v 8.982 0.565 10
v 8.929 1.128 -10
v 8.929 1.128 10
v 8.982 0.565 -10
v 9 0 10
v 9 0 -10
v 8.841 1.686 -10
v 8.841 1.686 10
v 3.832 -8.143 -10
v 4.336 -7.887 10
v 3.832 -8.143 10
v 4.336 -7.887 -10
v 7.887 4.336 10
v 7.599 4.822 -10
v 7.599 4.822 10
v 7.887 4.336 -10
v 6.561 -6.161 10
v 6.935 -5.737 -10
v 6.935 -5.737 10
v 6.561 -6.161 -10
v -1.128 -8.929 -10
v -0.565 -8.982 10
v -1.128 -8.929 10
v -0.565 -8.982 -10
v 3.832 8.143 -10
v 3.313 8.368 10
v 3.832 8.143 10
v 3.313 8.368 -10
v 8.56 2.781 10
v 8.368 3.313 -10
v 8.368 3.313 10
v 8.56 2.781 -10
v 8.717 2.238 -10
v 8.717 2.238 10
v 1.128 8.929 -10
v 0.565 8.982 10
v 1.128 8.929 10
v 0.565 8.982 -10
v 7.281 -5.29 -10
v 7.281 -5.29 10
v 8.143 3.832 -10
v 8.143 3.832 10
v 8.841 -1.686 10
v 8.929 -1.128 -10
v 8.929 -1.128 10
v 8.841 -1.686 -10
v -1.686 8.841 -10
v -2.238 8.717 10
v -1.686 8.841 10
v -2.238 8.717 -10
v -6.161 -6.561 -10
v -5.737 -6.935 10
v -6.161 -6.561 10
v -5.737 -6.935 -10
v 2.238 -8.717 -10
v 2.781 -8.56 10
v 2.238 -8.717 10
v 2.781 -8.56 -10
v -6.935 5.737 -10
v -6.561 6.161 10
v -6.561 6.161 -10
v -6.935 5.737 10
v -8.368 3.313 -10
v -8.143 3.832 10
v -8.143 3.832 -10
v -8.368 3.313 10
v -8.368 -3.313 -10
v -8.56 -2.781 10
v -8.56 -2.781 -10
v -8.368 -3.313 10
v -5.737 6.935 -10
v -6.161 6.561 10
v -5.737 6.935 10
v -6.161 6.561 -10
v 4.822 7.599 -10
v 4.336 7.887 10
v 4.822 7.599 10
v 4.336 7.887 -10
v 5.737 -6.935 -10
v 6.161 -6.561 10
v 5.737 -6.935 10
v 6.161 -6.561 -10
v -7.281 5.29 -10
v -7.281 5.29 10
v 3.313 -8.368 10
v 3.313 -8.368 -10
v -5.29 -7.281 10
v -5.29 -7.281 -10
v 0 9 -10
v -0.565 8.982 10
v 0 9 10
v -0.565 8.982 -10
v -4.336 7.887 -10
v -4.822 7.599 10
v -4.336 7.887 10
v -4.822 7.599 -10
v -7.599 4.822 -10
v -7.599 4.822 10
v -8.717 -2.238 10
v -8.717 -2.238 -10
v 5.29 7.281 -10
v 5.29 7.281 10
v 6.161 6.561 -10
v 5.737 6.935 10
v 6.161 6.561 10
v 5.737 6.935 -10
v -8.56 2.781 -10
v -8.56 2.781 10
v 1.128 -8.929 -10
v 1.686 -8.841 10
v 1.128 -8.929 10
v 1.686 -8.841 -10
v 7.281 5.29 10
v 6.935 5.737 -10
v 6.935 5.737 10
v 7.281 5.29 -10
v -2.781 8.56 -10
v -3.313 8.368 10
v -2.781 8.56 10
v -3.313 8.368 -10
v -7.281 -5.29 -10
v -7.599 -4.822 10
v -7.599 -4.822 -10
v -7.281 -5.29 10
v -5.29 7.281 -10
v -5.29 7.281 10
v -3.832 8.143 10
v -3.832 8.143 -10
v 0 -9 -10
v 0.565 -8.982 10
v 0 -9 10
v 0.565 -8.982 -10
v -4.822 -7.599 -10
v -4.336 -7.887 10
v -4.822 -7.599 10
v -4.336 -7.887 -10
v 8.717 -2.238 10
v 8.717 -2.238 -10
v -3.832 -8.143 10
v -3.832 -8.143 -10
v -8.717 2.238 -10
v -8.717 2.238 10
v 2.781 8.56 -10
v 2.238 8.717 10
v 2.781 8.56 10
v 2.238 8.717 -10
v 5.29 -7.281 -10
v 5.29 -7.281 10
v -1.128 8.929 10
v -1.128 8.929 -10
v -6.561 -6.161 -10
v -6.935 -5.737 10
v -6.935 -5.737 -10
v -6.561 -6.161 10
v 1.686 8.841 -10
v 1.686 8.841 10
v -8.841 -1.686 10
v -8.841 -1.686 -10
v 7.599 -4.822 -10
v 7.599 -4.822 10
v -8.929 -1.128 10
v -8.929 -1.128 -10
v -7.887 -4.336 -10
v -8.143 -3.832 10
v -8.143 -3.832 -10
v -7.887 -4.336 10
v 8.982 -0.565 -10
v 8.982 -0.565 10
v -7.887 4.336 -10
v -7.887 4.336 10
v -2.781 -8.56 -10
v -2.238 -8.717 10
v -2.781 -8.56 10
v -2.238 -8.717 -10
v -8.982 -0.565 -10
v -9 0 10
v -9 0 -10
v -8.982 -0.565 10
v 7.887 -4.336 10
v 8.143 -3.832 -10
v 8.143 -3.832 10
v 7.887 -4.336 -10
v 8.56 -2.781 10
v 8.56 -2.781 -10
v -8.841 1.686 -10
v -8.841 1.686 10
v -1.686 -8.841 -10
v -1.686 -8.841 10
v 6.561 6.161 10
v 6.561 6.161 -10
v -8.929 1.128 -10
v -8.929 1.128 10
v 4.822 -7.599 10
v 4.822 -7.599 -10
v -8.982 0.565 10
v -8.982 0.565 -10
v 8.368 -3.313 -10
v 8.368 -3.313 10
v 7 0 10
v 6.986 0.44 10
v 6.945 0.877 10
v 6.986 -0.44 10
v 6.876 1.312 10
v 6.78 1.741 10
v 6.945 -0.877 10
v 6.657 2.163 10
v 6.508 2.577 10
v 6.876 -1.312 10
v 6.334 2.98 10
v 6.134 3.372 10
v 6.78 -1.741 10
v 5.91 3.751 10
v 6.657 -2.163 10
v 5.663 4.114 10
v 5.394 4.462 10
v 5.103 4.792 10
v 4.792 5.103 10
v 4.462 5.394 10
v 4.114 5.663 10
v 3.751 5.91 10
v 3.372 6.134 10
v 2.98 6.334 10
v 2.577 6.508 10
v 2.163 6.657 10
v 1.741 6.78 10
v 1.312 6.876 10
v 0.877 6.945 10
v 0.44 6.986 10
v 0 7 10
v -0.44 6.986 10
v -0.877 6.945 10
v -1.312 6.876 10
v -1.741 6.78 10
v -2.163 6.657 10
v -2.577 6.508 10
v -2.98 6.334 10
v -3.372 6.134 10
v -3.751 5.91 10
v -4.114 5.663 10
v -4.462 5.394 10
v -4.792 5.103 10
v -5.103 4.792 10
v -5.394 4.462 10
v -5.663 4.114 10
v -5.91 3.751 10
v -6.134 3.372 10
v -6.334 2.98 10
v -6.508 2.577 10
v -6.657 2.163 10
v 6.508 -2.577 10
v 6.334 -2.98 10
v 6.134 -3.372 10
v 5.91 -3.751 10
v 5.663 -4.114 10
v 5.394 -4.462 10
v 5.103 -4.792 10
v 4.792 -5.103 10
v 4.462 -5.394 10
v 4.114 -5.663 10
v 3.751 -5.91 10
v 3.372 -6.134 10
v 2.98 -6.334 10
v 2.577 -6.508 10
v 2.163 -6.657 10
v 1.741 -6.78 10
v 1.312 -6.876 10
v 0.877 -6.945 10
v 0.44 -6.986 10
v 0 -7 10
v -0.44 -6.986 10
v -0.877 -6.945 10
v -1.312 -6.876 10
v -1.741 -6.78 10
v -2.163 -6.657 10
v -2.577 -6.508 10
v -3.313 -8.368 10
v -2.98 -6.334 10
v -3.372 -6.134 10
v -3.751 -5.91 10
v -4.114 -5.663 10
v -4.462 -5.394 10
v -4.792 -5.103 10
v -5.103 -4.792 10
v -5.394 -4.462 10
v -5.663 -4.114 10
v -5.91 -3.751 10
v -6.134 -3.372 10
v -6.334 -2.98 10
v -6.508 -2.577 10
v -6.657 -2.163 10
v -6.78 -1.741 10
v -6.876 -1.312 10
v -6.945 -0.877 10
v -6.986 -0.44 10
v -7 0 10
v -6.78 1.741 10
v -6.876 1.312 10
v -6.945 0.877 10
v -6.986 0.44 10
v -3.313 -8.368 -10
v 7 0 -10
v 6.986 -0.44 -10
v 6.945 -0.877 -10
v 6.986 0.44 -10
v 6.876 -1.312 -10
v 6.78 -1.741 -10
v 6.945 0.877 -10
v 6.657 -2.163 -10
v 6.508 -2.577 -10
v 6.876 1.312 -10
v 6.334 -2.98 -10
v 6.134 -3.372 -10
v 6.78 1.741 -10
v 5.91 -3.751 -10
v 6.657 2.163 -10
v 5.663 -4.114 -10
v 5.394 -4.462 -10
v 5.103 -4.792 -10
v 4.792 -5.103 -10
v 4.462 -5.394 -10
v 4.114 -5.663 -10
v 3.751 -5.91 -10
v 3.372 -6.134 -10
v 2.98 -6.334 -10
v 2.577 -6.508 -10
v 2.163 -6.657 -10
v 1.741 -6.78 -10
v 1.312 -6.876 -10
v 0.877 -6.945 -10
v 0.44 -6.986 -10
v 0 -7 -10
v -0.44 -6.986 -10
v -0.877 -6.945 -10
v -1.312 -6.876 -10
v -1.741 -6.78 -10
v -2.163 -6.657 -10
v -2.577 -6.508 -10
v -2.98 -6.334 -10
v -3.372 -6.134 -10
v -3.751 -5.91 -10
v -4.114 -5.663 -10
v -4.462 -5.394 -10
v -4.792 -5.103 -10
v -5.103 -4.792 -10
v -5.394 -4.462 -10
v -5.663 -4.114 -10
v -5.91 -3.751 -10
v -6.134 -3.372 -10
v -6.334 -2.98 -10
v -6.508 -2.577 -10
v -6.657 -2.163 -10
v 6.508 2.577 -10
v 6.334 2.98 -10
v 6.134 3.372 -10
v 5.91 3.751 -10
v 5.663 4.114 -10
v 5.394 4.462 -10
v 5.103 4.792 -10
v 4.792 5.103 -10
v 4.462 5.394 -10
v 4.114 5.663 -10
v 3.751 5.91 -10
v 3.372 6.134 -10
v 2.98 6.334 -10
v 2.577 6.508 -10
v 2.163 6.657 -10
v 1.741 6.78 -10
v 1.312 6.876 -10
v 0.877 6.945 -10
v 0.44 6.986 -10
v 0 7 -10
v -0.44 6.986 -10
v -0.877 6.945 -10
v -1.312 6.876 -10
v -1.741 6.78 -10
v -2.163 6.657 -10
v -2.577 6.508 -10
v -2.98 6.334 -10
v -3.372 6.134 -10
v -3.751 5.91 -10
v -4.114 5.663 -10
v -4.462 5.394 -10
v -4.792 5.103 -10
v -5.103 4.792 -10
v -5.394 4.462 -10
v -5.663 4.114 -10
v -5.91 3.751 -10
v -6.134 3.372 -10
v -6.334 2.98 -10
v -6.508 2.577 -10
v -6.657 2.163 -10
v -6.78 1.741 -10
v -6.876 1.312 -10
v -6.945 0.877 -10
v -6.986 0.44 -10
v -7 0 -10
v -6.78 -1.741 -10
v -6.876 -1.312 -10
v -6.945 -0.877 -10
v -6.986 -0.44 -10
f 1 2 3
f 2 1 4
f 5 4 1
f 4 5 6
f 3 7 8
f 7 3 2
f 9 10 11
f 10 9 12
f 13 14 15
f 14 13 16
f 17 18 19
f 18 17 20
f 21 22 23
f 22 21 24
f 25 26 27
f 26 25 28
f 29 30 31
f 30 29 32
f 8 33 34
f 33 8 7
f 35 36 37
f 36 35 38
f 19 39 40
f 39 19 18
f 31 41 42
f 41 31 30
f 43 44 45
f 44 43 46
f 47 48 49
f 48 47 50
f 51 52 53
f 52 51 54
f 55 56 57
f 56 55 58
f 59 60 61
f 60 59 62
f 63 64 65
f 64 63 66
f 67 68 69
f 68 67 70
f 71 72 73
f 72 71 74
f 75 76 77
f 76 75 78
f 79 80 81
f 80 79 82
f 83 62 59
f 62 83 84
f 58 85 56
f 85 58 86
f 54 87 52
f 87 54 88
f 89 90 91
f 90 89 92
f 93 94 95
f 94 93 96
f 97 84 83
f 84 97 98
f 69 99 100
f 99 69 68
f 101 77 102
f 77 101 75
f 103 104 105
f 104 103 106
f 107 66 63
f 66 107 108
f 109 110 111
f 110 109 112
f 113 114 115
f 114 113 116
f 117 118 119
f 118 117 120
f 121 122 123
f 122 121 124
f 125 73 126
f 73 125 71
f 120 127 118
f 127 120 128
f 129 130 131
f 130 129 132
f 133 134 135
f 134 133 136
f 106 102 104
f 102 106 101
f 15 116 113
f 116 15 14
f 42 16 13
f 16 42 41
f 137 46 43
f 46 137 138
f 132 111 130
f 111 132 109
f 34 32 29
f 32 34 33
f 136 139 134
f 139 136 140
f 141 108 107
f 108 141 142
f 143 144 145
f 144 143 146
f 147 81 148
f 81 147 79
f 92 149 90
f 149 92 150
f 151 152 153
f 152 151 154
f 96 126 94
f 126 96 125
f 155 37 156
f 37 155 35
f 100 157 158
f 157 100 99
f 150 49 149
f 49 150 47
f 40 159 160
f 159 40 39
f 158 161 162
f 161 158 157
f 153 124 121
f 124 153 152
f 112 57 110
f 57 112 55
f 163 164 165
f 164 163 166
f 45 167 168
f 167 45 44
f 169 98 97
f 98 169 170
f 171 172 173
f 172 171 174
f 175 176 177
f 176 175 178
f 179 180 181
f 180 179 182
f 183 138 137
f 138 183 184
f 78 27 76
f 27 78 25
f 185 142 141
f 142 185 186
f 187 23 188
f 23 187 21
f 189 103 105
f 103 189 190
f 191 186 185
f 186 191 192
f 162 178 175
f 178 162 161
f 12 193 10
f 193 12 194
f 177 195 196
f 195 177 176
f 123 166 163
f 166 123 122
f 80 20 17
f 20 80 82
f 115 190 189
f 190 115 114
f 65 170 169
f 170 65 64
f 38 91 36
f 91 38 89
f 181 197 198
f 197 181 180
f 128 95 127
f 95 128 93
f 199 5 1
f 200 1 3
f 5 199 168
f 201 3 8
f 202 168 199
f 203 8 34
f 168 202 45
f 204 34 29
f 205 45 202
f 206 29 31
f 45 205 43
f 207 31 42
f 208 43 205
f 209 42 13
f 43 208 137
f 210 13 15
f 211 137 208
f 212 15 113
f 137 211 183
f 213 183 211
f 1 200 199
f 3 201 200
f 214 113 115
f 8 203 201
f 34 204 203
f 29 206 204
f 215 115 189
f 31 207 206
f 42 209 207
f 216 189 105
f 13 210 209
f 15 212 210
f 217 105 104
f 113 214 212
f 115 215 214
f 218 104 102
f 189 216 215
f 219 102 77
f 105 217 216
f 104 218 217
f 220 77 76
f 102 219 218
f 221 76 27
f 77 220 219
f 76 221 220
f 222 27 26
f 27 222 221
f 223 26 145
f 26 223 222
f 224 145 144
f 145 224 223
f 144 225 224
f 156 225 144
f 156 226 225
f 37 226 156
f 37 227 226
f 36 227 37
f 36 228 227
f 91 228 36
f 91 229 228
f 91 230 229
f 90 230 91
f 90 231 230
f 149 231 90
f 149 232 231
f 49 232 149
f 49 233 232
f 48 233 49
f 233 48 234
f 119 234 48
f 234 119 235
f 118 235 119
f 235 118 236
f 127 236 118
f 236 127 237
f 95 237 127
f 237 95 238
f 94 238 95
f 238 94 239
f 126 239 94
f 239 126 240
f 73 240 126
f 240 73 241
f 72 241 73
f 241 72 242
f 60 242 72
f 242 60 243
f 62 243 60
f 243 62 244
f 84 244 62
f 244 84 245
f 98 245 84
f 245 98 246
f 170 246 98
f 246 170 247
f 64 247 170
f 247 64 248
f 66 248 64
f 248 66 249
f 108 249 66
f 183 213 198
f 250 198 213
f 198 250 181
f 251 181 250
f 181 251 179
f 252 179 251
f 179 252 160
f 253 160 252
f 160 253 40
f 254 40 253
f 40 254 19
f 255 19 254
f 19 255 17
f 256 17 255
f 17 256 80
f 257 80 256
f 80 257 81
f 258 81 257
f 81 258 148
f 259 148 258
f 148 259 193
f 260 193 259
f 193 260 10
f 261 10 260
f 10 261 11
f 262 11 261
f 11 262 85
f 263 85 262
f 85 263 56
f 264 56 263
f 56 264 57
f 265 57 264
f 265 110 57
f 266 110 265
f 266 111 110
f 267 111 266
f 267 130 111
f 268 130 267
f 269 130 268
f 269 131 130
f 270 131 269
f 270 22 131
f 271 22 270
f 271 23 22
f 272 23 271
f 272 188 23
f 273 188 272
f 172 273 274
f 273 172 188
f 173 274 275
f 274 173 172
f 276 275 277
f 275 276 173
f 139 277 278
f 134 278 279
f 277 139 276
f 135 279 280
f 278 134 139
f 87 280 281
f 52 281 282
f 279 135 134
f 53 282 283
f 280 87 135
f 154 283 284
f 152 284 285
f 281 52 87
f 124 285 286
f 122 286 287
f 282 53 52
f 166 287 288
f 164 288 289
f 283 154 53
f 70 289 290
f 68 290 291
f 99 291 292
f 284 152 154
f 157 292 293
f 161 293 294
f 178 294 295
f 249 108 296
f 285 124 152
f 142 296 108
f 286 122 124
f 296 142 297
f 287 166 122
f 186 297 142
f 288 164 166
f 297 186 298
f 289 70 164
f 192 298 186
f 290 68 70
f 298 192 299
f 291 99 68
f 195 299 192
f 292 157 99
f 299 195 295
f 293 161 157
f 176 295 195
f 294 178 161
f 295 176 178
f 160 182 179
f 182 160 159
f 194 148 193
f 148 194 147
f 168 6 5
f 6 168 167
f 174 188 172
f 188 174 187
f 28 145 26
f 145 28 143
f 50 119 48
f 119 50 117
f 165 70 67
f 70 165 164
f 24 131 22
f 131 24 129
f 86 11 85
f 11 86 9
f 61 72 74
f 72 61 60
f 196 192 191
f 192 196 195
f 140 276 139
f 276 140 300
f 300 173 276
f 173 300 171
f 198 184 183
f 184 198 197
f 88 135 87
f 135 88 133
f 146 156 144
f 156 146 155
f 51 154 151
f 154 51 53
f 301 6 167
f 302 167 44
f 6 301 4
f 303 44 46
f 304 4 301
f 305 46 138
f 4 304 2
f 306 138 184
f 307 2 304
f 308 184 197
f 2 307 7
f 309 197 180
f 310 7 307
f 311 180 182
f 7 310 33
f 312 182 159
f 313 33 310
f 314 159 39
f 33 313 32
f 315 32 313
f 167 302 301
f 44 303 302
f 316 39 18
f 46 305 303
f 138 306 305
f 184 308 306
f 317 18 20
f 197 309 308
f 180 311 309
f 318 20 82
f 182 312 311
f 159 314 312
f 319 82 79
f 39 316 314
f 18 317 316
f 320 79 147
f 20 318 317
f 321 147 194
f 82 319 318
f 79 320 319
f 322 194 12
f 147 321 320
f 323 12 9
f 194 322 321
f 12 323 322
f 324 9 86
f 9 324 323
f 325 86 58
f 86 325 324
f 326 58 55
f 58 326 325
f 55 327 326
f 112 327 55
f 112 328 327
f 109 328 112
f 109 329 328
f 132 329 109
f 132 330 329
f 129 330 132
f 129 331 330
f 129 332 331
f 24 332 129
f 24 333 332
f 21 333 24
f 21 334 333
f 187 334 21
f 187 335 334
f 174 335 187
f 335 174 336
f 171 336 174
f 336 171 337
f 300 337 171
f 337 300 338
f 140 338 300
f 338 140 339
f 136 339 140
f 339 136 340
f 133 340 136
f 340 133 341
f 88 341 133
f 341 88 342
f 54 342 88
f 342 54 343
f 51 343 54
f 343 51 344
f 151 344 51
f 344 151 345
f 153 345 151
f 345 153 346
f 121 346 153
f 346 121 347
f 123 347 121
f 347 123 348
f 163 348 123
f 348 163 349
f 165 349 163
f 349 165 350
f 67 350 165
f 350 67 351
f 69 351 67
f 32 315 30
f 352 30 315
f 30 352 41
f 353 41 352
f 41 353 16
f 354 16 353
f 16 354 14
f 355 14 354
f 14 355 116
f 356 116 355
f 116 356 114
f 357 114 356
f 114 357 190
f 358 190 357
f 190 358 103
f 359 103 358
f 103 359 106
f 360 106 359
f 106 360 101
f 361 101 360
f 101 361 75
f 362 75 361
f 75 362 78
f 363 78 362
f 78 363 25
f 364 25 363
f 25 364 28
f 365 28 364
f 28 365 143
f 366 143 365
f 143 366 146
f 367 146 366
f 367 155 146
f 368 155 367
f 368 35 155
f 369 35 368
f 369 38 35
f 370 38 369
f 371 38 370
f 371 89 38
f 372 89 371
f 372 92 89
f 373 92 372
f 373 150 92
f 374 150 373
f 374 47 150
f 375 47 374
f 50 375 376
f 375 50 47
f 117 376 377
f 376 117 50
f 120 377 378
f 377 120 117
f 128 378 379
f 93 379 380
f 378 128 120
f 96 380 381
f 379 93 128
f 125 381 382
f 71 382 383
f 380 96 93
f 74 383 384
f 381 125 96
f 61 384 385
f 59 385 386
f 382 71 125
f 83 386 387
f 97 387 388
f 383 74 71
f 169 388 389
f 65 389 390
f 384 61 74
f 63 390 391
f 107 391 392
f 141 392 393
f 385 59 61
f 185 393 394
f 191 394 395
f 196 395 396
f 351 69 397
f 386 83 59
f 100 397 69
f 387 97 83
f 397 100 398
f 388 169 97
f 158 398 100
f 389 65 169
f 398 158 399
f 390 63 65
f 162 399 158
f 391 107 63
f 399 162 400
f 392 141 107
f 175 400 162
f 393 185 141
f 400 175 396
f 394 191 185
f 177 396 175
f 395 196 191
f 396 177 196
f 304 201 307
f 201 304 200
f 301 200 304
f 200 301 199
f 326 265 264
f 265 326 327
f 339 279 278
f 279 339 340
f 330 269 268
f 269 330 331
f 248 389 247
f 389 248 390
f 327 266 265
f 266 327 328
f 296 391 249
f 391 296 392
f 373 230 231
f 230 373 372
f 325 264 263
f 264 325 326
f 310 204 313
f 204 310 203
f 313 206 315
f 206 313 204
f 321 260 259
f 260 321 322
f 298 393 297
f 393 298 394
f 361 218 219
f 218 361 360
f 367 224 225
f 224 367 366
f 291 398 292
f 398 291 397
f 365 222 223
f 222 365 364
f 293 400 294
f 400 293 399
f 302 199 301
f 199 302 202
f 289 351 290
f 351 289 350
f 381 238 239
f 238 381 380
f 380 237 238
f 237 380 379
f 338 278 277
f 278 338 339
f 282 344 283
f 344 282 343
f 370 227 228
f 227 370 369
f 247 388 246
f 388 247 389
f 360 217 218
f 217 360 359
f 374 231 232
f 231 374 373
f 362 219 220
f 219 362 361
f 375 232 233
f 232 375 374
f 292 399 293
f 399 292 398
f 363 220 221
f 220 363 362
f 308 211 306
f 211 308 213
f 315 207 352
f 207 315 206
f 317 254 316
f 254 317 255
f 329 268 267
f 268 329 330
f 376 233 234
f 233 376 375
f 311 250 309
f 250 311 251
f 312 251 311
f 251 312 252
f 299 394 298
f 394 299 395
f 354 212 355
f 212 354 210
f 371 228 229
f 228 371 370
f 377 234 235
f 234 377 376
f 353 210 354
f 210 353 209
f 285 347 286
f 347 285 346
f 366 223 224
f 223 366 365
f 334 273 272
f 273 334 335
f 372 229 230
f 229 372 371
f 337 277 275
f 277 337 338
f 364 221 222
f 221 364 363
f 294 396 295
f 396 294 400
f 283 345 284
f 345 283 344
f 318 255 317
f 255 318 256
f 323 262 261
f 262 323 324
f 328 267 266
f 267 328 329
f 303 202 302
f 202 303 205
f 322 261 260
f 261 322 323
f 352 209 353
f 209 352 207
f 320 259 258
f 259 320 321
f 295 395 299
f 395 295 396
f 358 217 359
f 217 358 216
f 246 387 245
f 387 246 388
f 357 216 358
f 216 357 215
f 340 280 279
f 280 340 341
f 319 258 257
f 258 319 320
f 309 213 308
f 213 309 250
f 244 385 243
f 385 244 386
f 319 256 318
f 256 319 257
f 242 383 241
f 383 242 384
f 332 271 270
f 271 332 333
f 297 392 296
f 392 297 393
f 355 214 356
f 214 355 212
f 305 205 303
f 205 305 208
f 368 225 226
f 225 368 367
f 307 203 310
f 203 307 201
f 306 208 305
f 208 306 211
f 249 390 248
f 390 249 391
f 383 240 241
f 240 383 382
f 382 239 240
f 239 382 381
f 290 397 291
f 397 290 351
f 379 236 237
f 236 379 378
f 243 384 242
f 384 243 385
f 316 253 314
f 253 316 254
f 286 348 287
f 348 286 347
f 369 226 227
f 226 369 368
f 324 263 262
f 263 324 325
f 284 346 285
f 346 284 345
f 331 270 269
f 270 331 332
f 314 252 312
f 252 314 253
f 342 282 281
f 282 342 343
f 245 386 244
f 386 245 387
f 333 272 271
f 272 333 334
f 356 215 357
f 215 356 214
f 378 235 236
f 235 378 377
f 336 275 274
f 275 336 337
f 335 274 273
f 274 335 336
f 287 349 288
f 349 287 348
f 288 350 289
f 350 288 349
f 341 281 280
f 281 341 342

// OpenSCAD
module aa(){
difference(){
cube([200,100,100],center=true);
translate([2,2,2])cube([200,100,100],center=true);
}
}


module bb(){
difference(){
cylinder(r=9,h=20,center=true,$fn=100);
cylinder(r=7,h=20,center=true,$fn=100);
}
}


bb();
